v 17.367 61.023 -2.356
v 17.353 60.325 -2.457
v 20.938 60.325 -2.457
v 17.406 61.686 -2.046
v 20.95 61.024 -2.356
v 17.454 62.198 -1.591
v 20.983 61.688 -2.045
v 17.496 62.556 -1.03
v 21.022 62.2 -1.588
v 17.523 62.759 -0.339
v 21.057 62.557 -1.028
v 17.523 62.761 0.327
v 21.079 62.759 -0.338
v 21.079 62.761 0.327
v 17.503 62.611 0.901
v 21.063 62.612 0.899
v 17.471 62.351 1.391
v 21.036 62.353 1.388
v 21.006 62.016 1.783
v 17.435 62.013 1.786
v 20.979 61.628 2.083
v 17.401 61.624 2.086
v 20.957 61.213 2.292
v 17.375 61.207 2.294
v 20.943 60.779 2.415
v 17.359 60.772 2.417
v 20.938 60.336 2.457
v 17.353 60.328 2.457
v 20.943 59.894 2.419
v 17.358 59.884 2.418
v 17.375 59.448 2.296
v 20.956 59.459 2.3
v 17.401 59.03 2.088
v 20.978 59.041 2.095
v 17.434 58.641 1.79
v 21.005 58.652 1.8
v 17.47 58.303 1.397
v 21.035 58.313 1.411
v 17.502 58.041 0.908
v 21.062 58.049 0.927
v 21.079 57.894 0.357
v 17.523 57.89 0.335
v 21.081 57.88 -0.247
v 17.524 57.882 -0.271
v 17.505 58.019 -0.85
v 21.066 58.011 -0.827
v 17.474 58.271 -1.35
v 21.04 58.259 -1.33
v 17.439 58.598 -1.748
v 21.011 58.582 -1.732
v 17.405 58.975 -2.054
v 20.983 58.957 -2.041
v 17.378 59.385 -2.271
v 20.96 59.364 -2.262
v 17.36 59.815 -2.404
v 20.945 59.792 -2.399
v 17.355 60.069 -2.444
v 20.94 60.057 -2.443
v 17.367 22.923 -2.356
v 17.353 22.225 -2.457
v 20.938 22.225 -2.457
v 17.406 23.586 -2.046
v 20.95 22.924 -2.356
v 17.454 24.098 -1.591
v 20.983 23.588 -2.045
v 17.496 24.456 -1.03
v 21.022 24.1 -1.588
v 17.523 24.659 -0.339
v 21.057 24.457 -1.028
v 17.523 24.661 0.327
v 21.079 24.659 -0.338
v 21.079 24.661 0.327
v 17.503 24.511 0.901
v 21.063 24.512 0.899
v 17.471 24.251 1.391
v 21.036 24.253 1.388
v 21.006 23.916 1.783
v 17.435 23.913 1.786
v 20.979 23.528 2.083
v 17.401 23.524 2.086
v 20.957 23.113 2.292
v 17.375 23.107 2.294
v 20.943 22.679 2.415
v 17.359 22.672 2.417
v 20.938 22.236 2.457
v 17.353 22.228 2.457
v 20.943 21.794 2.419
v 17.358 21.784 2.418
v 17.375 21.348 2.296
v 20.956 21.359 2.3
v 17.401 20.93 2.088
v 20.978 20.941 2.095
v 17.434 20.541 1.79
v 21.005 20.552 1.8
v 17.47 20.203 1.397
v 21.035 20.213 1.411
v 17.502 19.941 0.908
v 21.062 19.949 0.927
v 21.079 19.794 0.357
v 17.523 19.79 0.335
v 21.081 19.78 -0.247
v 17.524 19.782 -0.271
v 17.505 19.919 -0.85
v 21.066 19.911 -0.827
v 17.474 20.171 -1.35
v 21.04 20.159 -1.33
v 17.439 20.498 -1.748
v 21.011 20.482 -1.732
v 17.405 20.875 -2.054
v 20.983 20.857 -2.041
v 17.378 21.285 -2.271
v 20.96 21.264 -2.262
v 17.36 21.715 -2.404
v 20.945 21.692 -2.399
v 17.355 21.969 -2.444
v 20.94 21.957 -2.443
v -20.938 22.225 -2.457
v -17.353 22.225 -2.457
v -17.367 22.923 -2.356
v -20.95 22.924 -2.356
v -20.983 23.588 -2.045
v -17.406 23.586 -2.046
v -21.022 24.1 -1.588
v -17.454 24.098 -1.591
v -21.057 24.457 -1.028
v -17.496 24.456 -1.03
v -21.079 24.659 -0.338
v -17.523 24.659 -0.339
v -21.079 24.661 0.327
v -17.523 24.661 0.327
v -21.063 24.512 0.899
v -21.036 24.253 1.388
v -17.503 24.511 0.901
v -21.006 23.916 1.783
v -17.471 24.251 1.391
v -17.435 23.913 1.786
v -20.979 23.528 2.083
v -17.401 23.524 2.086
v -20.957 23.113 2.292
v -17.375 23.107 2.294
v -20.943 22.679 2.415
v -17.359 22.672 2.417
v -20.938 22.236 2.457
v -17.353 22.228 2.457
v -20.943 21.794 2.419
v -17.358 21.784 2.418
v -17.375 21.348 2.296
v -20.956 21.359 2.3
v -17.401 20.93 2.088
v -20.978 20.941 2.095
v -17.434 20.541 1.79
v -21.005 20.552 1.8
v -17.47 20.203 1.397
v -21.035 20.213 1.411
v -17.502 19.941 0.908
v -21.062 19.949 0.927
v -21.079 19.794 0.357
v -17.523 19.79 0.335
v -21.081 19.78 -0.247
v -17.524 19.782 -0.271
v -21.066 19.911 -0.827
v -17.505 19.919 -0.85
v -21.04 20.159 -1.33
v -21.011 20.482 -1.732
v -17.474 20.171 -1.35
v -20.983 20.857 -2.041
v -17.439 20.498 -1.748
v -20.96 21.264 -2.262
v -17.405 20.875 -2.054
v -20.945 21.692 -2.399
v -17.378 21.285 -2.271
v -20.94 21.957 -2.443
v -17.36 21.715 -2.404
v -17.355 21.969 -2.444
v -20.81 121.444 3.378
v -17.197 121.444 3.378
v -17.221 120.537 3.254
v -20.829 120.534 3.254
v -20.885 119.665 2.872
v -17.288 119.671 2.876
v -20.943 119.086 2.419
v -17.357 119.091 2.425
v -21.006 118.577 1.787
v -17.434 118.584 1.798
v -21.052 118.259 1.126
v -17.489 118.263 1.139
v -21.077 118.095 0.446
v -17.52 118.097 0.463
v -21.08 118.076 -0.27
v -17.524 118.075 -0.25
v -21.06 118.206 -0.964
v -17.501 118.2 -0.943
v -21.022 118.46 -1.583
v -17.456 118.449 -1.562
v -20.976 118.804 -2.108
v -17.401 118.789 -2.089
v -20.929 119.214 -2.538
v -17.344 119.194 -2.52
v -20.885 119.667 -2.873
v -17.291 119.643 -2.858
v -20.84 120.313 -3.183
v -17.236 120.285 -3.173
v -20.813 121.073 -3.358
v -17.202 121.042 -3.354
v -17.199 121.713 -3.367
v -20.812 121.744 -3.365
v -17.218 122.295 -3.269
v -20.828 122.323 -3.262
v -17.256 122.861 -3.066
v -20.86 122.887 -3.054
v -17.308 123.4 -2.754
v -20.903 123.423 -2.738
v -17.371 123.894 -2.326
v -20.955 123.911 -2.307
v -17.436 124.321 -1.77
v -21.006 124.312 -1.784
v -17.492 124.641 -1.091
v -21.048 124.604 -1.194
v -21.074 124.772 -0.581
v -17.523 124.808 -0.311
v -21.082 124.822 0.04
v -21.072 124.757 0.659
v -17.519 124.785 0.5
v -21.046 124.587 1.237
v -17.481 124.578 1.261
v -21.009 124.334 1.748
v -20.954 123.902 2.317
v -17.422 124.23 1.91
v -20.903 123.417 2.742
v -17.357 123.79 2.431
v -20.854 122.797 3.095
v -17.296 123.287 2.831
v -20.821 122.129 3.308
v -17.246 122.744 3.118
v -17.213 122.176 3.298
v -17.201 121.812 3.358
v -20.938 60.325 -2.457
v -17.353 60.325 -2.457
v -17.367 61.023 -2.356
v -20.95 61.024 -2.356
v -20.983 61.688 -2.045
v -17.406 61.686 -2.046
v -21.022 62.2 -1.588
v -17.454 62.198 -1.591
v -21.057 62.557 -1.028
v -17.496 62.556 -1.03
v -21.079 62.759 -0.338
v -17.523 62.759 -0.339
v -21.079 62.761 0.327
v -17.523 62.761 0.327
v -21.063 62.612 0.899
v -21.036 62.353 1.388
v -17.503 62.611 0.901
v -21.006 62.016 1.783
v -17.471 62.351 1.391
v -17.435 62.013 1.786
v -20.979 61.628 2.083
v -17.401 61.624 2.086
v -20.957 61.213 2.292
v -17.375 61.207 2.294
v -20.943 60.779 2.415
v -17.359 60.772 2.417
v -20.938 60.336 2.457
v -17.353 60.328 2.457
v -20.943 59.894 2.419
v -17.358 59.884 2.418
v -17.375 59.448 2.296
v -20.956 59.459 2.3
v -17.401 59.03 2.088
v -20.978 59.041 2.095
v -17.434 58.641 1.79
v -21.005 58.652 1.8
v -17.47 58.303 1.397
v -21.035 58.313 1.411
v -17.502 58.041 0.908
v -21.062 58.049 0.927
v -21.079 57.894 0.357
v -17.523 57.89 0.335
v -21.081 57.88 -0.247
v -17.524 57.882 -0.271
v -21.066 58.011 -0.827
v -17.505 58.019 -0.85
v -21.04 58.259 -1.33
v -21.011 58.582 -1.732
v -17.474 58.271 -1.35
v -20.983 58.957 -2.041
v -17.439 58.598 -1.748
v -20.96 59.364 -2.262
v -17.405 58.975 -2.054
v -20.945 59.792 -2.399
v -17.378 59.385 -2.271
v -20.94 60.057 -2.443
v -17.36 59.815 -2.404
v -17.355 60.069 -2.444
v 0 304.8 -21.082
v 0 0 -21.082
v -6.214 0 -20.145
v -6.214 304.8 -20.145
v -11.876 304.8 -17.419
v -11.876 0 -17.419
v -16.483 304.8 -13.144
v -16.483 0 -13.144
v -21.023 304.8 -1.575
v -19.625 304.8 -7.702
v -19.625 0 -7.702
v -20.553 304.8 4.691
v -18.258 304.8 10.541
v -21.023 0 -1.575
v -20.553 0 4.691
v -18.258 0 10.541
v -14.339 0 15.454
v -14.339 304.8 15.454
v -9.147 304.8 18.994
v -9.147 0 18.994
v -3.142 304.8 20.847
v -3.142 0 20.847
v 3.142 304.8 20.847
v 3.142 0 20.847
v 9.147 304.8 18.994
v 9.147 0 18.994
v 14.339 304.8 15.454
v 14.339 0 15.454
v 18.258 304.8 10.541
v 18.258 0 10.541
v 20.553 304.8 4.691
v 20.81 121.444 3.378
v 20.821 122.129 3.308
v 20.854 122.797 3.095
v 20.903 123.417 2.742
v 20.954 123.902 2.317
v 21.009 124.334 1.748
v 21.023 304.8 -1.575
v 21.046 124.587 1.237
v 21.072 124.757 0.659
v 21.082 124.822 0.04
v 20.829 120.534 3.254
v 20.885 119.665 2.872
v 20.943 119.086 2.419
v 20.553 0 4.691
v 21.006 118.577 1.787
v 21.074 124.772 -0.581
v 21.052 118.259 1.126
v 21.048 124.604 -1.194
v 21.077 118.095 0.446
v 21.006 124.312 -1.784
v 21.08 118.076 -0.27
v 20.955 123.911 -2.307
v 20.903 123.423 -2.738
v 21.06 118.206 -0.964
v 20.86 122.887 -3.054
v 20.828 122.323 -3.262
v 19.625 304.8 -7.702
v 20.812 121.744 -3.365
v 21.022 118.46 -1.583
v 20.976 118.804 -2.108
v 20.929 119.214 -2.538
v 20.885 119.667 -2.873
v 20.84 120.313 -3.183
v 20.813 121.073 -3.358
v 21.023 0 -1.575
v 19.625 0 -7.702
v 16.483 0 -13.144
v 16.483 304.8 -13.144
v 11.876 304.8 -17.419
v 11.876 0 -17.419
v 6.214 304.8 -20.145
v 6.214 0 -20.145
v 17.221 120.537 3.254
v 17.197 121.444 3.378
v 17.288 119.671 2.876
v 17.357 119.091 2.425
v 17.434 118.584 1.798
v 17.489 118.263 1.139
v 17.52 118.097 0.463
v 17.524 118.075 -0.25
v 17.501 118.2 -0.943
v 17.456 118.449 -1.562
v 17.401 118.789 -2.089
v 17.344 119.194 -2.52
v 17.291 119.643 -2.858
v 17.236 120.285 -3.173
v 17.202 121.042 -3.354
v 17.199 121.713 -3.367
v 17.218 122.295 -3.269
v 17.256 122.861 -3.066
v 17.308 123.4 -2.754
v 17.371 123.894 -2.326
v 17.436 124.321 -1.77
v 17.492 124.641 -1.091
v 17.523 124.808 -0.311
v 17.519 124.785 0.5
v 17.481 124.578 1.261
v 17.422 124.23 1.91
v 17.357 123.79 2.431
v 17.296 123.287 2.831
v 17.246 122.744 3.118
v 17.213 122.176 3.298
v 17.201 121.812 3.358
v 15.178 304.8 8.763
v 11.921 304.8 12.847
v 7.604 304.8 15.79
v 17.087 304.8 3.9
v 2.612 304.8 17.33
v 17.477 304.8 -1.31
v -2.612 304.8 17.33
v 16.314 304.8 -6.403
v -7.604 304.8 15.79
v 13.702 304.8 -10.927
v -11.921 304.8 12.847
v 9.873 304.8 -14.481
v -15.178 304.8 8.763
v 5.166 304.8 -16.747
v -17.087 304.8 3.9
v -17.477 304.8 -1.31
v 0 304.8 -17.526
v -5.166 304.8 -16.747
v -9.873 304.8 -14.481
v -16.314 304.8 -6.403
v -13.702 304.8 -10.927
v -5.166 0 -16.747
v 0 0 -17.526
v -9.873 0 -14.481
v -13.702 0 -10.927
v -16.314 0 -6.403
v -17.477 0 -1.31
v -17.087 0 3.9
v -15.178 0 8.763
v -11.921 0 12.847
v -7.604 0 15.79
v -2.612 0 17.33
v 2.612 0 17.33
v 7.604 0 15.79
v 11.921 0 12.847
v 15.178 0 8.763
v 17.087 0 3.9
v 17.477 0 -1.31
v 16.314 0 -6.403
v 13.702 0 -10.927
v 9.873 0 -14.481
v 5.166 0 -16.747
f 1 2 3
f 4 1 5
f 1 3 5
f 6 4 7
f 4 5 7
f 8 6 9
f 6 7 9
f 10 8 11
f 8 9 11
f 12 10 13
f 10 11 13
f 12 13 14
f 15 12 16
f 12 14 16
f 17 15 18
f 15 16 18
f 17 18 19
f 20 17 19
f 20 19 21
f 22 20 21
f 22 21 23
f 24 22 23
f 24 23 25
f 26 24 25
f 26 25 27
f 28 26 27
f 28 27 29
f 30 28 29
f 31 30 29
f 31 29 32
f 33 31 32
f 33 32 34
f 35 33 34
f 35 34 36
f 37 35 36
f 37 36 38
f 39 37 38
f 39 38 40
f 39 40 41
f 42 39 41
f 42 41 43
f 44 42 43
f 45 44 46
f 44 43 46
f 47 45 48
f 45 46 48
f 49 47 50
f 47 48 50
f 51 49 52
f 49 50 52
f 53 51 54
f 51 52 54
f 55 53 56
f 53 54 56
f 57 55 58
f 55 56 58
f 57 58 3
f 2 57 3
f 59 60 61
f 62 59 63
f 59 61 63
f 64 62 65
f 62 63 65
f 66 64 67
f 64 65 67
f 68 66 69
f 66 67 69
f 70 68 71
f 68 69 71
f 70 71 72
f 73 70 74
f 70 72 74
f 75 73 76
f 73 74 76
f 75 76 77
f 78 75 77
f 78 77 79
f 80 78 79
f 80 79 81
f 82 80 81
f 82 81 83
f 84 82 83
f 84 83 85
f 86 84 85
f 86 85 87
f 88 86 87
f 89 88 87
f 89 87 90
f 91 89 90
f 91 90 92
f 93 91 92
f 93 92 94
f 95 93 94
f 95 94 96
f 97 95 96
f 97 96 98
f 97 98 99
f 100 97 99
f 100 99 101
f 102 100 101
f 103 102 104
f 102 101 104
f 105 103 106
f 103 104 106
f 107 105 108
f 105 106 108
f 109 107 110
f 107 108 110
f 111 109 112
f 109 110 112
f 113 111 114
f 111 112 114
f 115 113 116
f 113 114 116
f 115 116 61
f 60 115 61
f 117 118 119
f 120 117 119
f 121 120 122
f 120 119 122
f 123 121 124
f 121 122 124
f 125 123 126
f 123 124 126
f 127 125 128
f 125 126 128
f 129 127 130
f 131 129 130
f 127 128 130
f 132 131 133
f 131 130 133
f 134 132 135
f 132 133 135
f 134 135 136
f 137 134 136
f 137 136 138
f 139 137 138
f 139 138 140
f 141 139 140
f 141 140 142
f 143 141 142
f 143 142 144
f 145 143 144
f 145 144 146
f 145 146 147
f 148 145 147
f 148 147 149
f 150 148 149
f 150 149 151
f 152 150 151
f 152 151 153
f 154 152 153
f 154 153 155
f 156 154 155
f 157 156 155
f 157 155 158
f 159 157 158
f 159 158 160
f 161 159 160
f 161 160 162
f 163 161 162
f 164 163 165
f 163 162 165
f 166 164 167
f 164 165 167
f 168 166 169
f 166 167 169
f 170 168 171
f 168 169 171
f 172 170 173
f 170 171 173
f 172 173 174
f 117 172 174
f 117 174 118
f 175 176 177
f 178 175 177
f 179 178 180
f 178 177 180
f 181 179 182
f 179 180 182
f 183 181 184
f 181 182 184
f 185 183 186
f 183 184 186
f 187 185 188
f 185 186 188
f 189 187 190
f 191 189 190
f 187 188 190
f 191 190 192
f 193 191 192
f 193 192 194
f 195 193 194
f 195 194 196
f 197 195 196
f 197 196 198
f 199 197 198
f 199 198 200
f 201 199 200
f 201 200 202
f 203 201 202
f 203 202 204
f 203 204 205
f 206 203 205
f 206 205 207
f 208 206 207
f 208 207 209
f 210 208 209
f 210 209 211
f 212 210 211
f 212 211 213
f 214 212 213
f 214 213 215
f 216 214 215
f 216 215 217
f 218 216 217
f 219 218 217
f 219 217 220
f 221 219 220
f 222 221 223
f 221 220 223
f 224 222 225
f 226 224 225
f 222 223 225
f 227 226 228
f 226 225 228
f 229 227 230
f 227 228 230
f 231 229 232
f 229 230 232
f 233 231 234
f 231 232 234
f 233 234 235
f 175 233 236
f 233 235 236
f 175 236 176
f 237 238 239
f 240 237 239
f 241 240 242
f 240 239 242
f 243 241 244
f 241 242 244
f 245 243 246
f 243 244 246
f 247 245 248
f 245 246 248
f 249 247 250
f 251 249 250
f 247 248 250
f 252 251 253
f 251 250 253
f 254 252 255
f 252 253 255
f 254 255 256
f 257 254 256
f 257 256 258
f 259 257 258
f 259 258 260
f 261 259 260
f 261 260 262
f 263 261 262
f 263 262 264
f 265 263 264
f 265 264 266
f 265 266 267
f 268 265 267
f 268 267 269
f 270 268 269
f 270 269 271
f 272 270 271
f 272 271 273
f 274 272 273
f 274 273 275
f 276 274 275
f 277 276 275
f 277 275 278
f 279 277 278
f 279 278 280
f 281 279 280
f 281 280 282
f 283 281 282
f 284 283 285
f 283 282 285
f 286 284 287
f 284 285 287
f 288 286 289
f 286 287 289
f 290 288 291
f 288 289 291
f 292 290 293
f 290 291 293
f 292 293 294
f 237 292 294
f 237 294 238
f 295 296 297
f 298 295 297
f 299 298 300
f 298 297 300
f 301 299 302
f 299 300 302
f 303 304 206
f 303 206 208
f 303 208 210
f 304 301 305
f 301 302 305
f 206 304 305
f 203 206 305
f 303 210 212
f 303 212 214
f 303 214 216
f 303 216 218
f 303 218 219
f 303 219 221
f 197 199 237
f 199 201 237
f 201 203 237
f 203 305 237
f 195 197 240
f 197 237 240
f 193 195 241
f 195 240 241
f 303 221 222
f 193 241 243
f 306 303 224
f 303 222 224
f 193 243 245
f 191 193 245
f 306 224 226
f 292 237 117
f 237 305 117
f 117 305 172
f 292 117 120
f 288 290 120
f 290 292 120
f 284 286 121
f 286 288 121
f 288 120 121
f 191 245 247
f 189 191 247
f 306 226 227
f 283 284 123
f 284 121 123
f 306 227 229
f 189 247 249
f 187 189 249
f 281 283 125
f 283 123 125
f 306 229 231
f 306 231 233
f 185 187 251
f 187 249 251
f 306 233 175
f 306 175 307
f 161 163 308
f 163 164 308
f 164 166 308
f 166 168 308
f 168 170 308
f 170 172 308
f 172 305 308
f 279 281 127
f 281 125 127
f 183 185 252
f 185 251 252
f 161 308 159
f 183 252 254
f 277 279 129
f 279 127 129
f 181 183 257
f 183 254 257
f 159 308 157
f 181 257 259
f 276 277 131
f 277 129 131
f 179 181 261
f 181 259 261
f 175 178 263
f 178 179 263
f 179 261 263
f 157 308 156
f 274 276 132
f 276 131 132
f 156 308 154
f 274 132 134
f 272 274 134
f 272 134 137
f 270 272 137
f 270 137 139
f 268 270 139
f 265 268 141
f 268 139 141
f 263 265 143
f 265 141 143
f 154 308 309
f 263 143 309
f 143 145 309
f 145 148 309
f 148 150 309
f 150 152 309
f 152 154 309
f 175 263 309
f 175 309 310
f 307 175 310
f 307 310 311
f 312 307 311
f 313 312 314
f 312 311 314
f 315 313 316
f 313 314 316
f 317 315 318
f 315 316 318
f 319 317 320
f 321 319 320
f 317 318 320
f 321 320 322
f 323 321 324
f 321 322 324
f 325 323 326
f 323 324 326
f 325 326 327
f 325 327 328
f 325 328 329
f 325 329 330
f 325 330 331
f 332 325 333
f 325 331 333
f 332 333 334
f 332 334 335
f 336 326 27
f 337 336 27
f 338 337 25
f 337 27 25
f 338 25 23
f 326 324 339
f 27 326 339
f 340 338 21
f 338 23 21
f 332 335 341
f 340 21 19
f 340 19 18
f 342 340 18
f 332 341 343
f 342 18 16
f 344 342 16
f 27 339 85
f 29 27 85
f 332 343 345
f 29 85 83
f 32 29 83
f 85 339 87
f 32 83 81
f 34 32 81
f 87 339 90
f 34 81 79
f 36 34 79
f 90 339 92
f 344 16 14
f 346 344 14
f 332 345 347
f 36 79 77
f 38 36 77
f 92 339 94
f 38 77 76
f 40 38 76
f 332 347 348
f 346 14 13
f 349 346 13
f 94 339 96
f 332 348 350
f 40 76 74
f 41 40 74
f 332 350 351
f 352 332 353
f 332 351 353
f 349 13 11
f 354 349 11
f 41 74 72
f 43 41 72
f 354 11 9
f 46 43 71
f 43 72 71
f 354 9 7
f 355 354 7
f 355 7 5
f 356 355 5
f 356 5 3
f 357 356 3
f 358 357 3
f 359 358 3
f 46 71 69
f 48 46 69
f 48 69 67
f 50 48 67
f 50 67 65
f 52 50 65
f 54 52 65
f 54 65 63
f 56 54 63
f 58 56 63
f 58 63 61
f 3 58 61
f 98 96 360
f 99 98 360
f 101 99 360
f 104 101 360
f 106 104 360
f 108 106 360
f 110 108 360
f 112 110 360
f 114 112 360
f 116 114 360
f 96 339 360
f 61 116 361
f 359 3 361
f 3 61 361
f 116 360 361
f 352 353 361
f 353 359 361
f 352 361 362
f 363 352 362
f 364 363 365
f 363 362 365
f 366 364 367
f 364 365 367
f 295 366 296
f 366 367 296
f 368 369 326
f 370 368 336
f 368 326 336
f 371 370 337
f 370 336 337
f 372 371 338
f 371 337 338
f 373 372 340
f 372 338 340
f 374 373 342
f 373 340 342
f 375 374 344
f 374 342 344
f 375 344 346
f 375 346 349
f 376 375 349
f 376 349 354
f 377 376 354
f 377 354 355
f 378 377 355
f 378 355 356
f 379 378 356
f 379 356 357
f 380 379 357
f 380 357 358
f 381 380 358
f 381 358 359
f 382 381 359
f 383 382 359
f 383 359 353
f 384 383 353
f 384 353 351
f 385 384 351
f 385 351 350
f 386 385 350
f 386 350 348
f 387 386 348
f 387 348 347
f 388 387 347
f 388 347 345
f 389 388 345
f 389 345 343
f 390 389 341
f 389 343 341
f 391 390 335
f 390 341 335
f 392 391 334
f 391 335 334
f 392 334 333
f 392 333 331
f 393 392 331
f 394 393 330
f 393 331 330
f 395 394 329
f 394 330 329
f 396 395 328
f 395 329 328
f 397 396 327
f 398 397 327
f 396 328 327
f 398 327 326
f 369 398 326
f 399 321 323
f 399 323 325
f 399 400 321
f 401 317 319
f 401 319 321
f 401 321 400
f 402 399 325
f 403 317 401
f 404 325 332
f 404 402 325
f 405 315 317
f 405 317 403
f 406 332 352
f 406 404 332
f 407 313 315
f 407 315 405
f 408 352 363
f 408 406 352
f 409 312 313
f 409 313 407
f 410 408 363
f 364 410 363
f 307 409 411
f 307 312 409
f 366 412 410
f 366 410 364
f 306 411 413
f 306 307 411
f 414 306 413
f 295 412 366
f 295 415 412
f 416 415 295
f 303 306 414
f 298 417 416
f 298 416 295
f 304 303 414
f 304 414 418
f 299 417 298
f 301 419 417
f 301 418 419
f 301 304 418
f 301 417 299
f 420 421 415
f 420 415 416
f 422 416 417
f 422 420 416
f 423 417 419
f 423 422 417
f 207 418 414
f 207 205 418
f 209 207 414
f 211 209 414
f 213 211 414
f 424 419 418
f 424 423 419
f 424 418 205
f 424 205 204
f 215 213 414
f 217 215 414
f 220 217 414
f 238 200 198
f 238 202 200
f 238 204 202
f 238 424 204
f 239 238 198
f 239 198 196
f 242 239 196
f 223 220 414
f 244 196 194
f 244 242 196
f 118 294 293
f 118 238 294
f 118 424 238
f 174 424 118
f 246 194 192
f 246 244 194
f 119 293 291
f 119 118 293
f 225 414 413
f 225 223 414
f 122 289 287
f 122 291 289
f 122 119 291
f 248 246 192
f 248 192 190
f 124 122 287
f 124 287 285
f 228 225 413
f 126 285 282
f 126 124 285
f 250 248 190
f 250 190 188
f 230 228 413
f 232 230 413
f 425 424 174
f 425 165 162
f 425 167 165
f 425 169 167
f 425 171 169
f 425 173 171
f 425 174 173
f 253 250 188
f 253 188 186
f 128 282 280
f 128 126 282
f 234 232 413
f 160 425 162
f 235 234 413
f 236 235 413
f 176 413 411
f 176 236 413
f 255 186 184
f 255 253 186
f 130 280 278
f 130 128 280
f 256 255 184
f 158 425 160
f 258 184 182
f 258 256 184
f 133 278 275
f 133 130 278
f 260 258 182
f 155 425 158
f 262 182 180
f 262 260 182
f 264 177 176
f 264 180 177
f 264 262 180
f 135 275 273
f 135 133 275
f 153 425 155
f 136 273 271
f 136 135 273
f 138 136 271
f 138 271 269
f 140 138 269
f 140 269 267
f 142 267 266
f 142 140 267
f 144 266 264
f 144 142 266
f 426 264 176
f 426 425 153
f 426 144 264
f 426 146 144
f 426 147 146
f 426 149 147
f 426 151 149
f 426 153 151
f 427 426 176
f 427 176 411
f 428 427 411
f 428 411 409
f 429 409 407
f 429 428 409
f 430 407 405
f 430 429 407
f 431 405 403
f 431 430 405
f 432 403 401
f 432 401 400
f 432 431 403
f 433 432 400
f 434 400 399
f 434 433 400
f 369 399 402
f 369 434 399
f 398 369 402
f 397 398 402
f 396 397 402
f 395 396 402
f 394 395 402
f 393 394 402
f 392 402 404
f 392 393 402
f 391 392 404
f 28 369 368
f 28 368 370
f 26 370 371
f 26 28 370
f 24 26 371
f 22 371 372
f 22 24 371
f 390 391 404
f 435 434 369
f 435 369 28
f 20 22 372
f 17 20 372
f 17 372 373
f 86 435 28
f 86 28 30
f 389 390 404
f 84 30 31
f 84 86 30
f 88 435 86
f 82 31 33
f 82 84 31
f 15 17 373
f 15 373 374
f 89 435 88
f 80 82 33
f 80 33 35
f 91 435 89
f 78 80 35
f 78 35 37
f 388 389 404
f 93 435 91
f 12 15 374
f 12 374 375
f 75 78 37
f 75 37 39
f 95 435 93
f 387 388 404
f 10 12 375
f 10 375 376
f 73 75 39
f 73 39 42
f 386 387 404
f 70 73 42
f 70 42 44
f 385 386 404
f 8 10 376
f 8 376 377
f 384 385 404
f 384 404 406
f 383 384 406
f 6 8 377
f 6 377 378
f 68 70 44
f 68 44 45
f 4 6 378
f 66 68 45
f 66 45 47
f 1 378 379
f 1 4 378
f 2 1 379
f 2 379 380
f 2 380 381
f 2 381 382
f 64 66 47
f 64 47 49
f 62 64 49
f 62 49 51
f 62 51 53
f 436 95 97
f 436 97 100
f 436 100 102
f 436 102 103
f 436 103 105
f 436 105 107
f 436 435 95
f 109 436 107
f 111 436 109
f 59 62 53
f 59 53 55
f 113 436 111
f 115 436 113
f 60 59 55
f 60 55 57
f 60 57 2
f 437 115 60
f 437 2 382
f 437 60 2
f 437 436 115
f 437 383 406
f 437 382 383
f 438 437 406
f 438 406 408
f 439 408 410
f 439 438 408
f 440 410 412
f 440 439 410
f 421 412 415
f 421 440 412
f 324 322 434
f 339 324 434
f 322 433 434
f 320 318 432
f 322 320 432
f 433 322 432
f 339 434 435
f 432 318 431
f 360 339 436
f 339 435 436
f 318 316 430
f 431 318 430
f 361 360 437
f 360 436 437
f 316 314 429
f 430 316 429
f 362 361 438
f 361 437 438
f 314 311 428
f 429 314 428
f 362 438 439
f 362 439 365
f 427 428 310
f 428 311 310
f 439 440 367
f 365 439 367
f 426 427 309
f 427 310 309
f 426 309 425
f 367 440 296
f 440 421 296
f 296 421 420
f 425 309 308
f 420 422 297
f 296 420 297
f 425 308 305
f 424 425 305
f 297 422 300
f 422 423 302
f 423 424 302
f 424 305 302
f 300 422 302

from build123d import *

# Parameters (mm, degrees)
SKETCH1_R                    = 21.082
SKETCH1_R_2                  = 17.526
BOSS_EXTRUDE1_DEPTH          = 304.8
F_10_0_1935_DIAMETER_HOLE1_D = 4.9149
F_1_4_CLEARANCE_HOLE1_D      = 6.7564


with BuildPart() as part:
    # Sketch1 → Boss-Extrude1 (new body)
    with BuildSketch(Plane(origin=(0, 0, 0), x_dir=(1, 0, 0), z_dir=(0, 1, 0))):
        with Locations(Location((0, 0, 0), (0, 0, 90))):
            Circle(SKETCH1_R)
        with Locations(Location((0, 0, 0), (0, 0, 90))):
            Circle(SKETCH1_R_2, mode=Mode.SUBTRACT)
    extrude(amount=BOSS_EXTRUDE1_DEPTH)

    # #10 (0.1935) Diameter Hole1 (through all)
    with Locations(Plane.ZY.offset(21.082)):
        with Locations((0, 22.225), (0, 60.325)):
            Hole(F_10_0_1935_DIAMETER_HOLE1_D / 2)

    # 1/4 Clearance Hole1 (through all)
    with Locations(Plane(origin=(-21.082, 0, 0), x_dir=(0, 0, -1), z_dir=(-1, 0, 0))):
        with Locations((0, -121.44375)):
            Hole(F_1_4_CLEARANCE_HOLE1_D / 2)


solid = part.part
